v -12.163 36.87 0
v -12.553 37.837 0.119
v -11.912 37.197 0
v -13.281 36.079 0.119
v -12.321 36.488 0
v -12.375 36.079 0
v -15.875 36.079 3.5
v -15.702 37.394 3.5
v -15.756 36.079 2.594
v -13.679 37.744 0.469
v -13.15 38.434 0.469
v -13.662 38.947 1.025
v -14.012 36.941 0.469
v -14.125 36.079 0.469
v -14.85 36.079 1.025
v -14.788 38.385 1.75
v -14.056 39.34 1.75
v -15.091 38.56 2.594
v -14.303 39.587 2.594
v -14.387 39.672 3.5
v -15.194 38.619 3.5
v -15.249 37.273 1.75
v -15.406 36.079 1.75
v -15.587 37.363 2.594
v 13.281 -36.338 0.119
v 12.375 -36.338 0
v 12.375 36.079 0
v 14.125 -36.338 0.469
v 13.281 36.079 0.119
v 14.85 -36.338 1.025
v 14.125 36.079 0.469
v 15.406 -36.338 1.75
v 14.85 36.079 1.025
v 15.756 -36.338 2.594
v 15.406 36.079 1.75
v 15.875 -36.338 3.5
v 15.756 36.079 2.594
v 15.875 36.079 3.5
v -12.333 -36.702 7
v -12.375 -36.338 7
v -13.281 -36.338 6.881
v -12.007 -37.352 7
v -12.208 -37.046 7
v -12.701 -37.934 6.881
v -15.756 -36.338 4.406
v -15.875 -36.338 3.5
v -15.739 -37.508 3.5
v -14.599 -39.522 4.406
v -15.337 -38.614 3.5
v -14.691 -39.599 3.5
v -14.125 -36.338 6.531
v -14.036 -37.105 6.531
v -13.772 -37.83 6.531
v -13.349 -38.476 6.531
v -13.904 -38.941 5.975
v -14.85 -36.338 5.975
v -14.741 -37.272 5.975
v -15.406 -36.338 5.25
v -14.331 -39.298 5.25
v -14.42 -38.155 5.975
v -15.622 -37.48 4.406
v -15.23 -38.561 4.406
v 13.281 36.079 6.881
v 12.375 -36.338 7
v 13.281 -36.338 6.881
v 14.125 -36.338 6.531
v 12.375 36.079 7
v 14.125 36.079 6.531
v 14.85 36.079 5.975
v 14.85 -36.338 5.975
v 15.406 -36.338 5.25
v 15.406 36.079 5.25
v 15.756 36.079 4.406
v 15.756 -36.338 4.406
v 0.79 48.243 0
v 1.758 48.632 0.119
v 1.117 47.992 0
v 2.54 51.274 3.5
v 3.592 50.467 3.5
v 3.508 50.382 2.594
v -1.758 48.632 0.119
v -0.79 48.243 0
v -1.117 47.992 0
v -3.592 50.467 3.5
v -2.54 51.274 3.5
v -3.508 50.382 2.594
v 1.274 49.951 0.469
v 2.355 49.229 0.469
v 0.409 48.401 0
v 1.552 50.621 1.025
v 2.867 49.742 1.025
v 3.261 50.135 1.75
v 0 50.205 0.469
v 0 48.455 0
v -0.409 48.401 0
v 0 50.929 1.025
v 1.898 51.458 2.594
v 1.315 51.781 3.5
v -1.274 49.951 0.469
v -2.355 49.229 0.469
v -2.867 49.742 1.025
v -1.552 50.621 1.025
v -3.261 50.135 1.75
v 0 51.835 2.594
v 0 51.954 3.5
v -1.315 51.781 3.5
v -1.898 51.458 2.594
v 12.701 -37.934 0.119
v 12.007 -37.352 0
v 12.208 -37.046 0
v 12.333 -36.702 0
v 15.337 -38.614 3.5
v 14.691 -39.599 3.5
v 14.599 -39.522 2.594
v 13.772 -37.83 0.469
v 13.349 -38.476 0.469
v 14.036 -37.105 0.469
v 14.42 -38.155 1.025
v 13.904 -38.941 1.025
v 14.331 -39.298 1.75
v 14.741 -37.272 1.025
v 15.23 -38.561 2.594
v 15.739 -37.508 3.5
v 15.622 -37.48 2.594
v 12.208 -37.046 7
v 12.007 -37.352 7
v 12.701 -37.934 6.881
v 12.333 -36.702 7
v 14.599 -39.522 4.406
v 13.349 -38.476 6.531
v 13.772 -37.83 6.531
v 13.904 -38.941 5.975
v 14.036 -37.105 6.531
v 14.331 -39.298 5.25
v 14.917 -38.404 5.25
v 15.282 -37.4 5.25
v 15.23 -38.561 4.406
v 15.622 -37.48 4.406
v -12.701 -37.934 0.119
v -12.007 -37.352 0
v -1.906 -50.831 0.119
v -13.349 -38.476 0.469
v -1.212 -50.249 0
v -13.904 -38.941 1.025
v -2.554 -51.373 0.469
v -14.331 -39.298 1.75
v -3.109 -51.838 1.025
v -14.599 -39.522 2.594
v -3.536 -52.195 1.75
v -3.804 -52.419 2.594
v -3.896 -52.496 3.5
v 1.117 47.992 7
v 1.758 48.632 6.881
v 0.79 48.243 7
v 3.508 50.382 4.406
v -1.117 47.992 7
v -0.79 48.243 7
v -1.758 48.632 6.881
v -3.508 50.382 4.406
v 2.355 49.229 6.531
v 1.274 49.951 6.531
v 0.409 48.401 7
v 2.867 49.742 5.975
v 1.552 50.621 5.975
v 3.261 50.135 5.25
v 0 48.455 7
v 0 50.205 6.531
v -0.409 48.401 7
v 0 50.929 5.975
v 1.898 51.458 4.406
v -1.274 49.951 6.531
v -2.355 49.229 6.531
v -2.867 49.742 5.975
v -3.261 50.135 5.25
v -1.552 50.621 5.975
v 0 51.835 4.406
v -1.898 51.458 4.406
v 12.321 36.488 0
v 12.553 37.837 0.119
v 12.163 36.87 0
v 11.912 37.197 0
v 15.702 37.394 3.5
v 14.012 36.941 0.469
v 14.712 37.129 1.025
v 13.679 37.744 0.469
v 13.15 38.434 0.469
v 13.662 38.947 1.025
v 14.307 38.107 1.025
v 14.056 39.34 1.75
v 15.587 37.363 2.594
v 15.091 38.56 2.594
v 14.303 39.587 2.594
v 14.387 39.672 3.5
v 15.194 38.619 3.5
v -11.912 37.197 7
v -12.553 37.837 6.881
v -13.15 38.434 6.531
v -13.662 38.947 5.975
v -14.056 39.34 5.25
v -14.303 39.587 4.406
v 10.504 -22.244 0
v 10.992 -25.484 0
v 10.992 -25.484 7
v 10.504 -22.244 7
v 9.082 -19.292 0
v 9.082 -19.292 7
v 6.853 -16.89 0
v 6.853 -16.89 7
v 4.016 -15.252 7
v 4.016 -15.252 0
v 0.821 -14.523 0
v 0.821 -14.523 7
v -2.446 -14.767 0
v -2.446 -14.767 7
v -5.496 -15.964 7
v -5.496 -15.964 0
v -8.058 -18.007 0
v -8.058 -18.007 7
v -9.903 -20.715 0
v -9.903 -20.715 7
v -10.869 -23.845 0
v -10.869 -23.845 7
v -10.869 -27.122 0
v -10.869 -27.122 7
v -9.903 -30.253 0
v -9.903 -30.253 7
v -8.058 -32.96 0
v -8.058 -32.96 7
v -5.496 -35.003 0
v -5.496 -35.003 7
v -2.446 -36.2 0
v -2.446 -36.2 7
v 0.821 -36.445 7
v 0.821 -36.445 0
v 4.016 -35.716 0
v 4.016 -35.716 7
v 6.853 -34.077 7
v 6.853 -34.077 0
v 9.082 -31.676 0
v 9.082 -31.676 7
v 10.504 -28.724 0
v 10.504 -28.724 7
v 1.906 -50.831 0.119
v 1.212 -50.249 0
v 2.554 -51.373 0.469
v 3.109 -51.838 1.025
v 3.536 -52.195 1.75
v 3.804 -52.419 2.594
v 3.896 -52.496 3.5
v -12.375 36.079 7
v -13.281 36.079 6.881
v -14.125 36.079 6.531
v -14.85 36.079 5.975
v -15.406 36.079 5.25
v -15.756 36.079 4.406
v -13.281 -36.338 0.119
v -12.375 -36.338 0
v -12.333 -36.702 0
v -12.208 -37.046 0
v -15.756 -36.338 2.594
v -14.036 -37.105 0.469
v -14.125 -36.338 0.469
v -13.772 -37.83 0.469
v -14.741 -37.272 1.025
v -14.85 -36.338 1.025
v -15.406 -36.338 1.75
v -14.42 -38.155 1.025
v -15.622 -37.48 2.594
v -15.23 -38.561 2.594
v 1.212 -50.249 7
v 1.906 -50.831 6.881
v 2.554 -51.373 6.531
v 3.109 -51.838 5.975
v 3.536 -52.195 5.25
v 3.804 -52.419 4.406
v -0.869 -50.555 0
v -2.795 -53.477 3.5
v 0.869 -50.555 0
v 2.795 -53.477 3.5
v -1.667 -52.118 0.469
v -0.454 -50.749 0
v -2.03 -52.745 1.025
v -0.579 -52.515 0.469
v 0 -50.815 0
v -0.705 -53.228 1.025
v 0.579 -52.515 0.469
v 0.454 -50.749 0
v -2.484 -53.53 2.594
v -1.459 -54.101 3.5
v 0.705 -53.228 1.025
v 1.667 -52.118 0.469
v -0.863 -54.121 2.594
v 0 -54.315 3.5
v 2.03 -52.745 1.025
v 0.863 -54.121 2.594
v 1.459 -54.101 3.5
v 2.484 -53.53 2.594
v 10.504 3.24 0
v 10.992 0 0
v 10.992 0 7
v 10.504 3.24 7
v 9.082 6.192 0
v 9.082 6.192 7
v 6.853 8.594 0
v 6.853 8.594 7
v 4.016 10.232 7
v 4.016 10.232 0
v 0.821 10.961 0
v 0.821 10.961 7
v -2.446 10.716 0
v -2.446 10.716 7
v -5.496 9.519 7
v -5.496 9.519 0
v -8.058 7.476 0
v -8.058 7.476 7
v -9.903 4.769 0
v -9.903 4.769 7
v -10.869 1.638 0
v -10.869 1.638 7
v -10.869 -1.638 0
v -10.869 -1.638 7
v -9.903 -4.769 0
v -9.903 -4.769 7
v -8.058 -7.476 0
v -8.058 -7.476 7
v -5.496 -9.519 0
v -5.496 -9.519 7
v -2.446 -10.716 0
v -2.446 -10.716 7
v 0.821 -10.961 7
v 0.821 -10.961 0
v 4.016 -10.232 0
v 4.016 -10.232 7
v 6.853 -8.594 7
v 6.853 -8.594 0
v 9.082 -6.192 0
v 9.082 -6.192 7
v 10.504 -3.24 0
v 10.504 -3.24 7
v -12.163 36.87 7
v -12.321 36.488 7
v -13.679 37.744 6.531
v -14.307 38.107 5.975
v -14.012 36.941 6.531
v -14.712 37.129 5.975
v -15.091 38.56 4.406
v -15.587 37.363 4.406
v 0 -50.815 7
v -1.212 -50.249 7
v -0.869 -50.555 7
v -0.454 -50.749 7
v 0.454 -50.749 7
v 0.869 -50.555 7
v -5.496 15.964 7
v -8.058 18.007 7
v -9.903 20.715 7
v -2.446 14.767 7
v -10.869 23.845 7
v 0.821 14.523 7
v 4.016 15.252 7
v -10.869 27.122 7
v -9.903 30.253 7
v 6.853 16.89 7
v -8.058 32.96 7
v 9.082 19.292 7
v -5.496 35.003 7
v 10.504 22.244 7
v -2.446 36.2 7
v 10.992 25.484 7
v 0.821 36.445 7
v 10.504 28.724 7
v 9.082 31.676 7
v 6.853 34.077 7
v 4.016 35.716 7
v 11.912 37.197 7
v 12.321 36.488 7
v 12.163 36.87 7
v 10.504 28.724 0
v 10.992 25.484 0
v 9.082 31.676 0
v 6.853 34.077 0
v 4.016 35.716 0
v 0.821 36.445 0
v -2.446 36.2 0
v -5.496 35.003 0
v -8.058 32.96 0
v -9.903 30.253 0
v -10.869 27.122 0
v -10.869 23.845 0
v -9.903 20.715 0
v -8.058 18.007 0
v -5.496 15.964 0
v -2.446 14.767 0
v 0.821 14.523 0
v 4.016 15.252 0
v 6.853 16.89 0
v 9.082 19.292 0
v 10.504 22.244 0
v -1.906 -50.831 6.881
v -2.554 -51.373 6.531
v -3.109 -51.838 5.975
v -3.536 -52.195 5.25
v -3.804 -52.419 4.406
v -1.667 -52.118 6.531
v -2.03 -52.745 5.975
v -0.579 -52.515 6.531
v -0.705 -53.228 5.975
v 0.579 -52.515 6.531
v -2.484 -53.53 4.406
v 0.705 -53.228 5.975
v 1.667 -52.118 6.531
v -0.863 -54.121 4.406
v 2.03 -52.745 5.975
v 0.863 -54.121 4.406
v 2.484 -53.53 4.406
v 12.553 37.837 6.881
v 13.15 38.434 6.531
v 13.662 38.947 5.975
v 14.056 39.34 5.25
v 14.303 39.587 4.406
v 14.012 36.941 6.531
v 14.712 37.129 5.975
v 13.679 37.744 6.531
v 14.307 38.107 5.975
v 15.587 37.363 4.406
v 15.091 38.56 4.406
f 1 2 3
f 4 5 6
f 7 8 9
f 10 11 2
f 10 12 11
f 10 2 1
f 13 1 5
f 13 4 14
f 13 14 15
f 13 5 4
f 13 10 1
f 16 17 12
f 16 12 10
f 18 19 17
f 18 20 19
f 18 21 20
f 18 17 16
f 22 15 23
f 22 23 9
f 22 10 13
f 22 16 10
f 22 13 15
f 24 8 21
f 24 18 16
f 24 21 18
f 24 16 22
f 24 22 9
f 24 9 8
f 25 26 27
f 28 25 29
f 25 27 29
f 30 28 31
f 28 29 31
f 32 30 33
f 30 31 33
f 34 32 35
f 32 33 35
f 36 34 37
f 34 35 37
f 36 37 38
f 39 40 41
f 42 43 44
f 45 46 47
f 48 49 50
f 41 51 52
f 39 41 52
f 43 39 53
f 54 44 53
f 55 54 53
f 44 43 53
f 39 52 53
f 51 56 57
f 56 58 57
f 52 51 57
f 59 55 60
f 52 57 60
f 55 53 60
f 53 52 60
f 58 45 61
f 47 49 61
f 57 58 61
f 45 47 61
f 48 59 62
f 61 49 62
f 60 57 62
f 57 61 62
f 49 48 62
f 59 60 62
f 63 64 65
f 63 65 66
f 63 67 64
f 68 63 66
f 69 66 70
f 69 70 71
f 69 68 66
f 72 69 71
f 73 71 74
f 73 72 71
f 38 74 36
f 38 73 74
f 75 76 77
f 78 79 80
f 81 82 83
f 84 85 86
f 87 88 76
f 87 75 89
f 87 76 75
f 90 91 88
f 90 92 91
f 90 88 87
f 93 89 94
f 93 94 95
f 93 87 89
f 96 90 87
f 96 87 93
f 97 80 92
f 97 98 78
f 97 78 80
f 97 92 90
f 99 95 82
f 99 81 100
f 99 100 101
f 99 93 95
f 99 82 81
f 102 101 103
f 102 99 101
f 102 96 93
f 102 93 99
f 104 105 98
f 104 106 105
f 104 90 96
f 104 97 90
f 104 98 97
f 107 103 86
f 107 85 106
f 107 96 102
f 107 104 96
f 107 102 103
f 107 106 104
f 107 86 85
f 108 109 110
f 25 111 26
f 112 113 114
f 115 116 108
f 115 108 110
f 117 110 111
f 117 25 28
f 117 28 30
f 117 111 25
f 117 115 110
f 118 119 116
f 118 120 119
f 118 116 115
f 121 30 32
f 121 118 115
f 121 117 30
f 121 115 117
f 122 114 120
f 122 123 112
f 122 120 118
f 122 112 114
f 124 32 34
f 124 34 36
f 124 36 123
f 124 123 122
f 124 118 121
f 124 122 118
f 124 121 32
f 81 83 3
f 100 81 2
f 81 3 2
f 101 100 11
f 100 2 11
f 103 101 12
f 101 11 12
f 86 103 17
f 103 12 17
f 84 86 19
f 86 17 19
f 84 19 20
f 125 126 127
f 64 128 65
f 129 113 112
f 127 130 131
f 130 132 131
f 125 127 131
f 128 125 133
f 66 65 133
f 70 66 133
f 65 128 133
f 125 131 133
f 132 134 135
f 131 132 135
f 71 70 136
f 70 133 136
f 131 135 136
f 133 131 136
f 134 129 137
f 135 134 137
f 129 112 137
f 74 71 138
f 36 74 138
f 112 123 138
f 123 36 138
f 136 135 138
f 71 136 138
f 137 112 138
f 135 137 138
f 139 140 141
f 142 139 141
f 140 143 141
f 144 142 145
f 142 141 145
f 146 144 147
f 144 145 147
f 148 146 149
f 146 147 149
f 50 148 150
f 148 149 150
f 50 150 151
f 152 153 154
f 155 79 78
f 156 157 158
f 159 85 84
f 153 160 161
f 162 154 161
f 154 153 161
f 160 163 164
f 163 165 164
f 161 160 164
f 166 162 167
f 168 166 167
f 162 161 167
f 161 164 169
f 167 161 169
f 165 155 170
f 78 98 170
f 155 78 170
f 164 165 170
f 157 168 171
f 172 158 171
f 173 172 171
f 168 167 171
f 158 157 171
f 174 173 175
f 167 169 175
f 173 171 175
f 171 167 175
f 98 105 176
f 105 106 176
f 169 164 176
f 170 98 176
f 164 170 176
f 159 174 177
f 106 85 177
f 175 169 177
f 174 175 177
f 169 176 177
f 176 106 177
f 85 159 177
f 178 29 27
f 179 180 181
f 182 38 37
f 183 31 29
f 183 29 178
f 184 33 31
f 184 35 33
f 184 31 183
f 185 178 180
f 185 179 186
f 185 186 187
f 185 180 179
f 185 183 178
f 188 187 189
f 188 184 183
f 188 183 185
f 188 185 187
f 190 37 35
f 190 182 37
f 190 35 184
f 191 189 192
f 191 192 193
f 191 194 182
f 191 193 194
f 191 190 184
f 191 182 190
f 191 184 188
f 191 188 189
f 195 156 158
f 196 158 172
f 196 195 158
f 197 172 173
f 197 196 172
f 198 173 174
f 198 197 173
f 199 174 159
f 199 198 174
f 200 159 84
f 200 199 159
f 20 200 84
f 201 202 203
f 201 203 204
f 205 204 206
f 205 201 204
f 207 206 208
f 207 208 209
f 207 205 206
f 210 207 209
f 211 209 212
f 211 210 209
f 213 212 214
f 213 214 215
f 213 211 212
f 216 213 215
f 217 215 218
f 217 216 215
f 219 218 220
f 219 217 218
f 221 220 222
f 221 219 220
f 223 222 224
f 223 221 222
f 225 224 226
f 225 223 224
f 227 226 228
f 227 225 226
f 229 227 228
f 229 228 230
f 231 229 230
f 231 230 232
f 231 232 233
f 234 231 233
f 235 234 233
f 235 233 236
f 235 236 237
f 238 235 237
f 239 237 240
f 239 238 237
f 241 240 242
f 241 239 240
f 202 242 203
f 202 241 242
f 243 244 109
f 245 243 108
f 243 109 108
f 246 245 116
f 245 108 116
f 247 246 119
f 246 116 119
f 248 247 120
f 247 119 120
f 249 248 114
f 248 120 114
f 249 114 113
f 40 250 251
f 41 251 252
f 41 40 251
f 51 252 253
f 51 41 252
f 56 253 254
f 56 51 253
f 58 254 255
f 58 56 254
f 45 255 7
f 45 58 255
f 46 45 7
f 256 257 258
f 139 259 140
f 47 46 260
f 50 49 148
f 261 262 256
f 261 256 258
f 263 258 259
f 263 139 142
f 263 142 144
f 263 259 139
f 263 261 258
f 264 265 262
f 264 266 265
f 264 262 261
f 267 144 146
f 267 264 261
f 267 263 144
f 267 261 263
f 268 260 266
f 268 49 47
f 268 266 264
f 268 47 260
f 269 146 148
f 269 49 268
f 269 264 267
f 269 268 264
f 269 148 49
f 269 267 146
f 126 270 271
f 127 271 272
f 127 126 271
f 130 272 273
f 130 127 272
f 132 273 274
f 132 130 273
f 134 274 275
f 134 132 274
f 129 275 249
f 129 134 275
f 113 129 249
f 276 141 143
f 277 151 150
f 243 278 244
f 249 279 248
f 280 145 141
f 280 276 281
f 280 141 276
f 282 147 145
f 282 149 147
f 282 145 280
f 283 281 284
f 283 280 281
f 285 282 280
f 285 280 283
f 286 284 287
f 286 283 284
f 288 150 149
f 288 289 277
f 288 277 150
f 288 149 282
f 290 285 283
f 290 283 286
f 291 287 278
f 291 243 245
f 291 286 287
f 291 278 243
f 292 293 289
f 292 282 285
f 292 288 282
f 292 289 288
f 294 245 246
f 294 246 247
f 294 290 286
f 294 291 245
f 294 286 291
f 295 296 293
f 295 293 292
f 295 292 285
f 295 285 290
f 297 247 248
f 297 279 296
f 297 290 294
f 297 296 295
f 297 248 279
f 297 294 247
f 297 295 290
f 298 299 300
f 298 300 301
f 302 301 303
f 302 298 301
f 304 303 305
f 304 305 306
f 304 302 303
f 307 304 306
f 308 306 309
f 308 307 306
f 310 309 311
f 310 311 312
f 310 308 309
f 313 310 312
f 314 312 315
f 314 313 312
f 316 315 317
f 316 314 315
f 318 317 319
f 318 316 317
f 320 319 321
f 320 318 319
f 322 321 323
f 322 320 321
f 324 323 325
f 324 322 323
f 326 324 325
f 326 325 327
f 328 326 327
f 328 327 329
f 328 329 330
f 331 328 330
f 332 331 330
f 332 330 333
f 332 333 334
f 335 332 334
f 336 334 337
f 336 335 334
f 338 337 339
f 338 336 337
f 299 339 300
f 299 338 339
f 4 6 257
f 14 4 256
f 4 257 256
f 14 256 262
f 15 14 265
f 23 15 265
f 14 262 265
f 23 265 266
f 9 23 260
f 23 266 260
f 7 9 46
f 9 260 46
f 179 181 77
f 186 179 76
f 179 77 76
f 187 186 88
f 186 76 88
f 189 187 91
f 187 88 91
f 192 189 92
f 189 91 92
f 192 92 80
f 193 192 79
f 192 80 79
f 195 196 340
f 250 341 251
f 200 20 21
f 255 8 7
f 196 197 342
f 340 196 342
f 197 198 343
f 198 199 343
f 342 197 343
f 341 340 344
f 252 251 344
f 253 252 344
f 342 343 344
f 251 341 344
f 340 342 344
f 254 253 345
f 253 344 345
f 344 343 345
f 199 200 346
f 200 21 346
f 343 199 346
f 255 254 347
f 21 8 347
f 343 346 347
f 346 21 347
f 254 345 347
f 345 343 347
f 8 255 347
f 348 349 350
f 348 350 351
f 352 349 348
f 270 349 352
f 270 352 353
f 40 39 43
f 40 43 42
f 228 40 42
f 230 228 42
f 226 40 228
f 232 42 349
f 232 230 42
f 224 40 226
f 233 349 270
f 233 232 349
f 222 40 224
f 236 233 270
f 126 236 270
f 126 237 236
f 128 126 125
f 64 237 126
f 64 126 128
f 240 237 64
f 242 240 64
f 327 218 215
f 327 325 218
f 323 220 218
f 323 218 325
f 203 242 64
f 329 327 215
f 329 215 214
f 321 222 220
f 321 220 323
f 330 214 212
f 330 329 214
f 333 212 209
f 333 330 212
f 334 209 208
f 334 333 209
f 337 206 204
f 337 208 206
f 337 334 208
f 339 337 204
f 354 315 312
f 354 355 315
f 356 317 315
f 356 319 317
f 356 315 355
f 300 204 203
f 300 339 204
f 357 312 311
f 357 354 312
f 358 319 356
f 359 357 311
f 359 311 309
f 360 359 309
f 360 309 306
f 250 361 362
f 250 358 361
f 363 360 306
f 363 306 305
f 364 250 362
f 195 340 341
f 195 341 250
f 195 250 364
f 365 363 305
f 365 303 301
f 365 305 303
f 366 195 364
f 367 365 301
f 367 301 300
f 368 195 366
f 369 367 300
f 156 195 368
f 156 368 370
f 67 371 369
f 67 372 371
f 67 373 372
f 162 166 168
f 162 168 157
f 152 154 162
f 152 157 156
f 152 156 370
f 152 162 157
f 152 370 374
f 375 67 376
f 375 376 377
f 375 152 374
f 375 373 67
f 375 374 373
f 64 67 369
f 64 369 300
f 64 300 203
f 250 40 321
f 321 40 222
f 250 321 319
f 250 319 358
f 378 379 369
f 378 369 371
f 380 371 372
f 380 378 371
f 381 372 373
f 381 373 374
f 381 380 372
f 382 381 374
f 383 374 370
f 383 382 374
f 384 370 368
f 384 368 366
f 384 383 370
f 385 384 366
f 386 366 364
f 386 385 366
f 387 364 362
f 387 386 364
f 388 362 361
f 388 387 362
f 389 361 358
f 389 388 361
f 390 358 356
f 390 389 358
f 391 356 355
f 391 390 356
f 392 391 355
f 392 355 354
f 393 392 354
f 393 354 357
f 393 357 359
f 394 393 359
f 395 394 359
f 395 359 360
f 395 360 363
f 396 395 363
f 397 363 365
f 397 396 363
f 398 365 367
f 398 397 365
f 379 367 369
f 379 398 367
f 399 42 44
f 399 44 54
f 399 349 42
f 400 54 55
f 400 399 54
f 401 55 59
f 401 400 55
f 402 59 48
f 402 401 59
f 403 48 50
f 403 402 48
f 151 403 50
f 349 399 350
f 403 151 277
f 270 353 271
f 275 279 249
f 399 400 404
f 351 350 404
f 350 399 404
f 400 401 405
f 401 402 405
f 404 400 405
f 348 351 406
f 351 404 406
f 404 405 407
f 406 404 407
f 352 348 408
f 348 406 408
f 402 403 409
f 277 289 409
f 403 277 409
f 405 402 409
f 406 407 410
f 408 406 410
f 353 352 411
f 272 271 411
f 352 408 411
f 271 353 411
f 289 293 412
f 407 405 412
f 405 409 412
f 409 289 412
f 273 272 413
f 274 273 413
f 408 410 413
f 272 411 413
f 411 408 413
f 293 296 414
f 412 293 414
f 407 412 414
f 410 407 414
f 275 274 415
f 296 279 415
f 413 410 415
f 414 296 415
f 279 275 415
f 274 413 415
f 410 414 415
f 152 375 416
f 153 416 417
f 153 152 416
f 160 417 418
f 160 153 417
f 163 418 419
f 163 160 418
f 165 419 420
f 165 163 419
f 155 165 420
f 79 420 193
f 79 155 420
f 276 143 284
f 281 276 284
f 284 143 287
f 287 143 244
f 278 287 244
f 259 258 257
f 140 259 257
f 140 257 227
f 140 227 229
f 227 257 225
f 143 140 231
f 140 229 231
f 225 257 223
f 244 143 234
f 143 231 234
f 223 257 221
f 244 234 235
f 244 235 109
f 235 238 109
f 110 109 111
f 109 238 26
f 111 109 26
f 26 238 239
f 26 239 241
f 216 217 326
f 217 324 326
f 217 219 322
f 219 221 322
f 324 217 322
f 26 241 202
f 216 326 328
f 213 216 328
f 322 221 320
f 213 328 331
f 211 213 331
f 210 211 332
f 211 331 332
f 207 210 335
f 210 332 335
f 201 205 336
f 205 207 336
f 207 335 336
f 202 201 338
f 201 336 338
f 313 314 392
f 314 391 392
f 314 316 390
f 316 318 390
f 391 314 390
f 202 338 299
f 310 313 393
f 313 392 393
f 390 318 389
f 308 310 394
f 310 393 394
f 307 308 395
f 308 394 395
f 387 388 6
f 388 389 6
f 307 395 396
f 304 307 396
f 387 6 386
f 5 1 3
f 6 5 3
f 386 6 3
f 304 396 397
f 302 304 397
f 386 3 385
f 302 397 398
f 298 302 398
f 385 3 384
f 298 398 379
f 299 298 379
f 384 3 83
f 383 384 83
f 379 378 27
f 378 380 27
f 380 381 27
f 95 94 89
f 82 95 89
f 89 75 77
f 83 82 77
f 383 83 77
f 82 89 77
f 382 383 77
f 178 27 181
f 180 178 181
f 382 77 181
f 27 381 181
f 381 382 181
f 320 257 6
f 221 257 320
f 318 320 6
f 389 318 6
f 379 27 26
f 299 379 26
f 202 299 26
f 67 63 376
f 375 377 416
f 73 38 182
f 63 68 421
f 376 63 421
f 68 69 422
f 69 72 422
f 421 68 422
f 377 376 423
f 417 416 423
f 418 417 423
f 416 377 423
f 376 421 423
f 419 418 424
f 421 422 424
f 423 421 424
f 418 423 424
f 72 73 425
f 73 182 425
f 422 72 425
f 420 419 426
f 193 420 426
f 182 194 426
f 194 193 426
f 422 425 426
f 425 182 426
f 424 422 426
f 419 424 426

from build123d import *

# Parameters (mm, degrees)
F1_R     = 10.99185
F2_DEPTH = 7
F3_R     = 5.08
F4_R     = 3.49999


# Not quite as in the source:
# - a fillet or chamfer is up to 0.001 mm smaller than in the source, because OpenCascade refuses the exact size


with BuildPart() as f2:
    # F1 (on Top) → F2 (new body)
    with BuildSketch(Plane.XY):
        Polygon((0, 54.0587), (-15.875, 38.1837), (-15.875, -38.1837), (0, -57.15), (15.875, -38.1837), (15.875, 38.1837), align=None)
        with Locations((0, -25.4837)):
            Circle(F1_R, mode=Mode.SUBTRACT)
        Circle(F1_R, mode=Mode.SUBTRACT)
        with Locations((0, 25.4837)):
            Circle(F1_R, mode=Mode.SUBTRACT)
    extrude(amount=F2_DEPTH)

    # F3
    f3_edges = [f2.edges().sort_by_distance(p)[0] for p in [
        (-15.875, -38.1837, 3.5),
        (0, -57.15, 3.5),
        (15.875, -38.1837, 3.5),
        (15.875, 38.1837, 3.5),
        (0, 54.0587, 3.5),
        (-15.875, 38.1837, 3.5),
    ]]
    fillet(f3_edges, radius=F3_R)

    # F4 (radius 3.5 in the source; OpenCascade refuses exactly that, so slightly less here)
    f4_edges = [f2.edges().sort_by_distance(p)[0] for p in [
        (-15.875, -0.129382, 0),
        (15.875, -0.129382, 7),
    ]]
    fillet(f4_edges, radius=F4_R)


solid = f2.part
